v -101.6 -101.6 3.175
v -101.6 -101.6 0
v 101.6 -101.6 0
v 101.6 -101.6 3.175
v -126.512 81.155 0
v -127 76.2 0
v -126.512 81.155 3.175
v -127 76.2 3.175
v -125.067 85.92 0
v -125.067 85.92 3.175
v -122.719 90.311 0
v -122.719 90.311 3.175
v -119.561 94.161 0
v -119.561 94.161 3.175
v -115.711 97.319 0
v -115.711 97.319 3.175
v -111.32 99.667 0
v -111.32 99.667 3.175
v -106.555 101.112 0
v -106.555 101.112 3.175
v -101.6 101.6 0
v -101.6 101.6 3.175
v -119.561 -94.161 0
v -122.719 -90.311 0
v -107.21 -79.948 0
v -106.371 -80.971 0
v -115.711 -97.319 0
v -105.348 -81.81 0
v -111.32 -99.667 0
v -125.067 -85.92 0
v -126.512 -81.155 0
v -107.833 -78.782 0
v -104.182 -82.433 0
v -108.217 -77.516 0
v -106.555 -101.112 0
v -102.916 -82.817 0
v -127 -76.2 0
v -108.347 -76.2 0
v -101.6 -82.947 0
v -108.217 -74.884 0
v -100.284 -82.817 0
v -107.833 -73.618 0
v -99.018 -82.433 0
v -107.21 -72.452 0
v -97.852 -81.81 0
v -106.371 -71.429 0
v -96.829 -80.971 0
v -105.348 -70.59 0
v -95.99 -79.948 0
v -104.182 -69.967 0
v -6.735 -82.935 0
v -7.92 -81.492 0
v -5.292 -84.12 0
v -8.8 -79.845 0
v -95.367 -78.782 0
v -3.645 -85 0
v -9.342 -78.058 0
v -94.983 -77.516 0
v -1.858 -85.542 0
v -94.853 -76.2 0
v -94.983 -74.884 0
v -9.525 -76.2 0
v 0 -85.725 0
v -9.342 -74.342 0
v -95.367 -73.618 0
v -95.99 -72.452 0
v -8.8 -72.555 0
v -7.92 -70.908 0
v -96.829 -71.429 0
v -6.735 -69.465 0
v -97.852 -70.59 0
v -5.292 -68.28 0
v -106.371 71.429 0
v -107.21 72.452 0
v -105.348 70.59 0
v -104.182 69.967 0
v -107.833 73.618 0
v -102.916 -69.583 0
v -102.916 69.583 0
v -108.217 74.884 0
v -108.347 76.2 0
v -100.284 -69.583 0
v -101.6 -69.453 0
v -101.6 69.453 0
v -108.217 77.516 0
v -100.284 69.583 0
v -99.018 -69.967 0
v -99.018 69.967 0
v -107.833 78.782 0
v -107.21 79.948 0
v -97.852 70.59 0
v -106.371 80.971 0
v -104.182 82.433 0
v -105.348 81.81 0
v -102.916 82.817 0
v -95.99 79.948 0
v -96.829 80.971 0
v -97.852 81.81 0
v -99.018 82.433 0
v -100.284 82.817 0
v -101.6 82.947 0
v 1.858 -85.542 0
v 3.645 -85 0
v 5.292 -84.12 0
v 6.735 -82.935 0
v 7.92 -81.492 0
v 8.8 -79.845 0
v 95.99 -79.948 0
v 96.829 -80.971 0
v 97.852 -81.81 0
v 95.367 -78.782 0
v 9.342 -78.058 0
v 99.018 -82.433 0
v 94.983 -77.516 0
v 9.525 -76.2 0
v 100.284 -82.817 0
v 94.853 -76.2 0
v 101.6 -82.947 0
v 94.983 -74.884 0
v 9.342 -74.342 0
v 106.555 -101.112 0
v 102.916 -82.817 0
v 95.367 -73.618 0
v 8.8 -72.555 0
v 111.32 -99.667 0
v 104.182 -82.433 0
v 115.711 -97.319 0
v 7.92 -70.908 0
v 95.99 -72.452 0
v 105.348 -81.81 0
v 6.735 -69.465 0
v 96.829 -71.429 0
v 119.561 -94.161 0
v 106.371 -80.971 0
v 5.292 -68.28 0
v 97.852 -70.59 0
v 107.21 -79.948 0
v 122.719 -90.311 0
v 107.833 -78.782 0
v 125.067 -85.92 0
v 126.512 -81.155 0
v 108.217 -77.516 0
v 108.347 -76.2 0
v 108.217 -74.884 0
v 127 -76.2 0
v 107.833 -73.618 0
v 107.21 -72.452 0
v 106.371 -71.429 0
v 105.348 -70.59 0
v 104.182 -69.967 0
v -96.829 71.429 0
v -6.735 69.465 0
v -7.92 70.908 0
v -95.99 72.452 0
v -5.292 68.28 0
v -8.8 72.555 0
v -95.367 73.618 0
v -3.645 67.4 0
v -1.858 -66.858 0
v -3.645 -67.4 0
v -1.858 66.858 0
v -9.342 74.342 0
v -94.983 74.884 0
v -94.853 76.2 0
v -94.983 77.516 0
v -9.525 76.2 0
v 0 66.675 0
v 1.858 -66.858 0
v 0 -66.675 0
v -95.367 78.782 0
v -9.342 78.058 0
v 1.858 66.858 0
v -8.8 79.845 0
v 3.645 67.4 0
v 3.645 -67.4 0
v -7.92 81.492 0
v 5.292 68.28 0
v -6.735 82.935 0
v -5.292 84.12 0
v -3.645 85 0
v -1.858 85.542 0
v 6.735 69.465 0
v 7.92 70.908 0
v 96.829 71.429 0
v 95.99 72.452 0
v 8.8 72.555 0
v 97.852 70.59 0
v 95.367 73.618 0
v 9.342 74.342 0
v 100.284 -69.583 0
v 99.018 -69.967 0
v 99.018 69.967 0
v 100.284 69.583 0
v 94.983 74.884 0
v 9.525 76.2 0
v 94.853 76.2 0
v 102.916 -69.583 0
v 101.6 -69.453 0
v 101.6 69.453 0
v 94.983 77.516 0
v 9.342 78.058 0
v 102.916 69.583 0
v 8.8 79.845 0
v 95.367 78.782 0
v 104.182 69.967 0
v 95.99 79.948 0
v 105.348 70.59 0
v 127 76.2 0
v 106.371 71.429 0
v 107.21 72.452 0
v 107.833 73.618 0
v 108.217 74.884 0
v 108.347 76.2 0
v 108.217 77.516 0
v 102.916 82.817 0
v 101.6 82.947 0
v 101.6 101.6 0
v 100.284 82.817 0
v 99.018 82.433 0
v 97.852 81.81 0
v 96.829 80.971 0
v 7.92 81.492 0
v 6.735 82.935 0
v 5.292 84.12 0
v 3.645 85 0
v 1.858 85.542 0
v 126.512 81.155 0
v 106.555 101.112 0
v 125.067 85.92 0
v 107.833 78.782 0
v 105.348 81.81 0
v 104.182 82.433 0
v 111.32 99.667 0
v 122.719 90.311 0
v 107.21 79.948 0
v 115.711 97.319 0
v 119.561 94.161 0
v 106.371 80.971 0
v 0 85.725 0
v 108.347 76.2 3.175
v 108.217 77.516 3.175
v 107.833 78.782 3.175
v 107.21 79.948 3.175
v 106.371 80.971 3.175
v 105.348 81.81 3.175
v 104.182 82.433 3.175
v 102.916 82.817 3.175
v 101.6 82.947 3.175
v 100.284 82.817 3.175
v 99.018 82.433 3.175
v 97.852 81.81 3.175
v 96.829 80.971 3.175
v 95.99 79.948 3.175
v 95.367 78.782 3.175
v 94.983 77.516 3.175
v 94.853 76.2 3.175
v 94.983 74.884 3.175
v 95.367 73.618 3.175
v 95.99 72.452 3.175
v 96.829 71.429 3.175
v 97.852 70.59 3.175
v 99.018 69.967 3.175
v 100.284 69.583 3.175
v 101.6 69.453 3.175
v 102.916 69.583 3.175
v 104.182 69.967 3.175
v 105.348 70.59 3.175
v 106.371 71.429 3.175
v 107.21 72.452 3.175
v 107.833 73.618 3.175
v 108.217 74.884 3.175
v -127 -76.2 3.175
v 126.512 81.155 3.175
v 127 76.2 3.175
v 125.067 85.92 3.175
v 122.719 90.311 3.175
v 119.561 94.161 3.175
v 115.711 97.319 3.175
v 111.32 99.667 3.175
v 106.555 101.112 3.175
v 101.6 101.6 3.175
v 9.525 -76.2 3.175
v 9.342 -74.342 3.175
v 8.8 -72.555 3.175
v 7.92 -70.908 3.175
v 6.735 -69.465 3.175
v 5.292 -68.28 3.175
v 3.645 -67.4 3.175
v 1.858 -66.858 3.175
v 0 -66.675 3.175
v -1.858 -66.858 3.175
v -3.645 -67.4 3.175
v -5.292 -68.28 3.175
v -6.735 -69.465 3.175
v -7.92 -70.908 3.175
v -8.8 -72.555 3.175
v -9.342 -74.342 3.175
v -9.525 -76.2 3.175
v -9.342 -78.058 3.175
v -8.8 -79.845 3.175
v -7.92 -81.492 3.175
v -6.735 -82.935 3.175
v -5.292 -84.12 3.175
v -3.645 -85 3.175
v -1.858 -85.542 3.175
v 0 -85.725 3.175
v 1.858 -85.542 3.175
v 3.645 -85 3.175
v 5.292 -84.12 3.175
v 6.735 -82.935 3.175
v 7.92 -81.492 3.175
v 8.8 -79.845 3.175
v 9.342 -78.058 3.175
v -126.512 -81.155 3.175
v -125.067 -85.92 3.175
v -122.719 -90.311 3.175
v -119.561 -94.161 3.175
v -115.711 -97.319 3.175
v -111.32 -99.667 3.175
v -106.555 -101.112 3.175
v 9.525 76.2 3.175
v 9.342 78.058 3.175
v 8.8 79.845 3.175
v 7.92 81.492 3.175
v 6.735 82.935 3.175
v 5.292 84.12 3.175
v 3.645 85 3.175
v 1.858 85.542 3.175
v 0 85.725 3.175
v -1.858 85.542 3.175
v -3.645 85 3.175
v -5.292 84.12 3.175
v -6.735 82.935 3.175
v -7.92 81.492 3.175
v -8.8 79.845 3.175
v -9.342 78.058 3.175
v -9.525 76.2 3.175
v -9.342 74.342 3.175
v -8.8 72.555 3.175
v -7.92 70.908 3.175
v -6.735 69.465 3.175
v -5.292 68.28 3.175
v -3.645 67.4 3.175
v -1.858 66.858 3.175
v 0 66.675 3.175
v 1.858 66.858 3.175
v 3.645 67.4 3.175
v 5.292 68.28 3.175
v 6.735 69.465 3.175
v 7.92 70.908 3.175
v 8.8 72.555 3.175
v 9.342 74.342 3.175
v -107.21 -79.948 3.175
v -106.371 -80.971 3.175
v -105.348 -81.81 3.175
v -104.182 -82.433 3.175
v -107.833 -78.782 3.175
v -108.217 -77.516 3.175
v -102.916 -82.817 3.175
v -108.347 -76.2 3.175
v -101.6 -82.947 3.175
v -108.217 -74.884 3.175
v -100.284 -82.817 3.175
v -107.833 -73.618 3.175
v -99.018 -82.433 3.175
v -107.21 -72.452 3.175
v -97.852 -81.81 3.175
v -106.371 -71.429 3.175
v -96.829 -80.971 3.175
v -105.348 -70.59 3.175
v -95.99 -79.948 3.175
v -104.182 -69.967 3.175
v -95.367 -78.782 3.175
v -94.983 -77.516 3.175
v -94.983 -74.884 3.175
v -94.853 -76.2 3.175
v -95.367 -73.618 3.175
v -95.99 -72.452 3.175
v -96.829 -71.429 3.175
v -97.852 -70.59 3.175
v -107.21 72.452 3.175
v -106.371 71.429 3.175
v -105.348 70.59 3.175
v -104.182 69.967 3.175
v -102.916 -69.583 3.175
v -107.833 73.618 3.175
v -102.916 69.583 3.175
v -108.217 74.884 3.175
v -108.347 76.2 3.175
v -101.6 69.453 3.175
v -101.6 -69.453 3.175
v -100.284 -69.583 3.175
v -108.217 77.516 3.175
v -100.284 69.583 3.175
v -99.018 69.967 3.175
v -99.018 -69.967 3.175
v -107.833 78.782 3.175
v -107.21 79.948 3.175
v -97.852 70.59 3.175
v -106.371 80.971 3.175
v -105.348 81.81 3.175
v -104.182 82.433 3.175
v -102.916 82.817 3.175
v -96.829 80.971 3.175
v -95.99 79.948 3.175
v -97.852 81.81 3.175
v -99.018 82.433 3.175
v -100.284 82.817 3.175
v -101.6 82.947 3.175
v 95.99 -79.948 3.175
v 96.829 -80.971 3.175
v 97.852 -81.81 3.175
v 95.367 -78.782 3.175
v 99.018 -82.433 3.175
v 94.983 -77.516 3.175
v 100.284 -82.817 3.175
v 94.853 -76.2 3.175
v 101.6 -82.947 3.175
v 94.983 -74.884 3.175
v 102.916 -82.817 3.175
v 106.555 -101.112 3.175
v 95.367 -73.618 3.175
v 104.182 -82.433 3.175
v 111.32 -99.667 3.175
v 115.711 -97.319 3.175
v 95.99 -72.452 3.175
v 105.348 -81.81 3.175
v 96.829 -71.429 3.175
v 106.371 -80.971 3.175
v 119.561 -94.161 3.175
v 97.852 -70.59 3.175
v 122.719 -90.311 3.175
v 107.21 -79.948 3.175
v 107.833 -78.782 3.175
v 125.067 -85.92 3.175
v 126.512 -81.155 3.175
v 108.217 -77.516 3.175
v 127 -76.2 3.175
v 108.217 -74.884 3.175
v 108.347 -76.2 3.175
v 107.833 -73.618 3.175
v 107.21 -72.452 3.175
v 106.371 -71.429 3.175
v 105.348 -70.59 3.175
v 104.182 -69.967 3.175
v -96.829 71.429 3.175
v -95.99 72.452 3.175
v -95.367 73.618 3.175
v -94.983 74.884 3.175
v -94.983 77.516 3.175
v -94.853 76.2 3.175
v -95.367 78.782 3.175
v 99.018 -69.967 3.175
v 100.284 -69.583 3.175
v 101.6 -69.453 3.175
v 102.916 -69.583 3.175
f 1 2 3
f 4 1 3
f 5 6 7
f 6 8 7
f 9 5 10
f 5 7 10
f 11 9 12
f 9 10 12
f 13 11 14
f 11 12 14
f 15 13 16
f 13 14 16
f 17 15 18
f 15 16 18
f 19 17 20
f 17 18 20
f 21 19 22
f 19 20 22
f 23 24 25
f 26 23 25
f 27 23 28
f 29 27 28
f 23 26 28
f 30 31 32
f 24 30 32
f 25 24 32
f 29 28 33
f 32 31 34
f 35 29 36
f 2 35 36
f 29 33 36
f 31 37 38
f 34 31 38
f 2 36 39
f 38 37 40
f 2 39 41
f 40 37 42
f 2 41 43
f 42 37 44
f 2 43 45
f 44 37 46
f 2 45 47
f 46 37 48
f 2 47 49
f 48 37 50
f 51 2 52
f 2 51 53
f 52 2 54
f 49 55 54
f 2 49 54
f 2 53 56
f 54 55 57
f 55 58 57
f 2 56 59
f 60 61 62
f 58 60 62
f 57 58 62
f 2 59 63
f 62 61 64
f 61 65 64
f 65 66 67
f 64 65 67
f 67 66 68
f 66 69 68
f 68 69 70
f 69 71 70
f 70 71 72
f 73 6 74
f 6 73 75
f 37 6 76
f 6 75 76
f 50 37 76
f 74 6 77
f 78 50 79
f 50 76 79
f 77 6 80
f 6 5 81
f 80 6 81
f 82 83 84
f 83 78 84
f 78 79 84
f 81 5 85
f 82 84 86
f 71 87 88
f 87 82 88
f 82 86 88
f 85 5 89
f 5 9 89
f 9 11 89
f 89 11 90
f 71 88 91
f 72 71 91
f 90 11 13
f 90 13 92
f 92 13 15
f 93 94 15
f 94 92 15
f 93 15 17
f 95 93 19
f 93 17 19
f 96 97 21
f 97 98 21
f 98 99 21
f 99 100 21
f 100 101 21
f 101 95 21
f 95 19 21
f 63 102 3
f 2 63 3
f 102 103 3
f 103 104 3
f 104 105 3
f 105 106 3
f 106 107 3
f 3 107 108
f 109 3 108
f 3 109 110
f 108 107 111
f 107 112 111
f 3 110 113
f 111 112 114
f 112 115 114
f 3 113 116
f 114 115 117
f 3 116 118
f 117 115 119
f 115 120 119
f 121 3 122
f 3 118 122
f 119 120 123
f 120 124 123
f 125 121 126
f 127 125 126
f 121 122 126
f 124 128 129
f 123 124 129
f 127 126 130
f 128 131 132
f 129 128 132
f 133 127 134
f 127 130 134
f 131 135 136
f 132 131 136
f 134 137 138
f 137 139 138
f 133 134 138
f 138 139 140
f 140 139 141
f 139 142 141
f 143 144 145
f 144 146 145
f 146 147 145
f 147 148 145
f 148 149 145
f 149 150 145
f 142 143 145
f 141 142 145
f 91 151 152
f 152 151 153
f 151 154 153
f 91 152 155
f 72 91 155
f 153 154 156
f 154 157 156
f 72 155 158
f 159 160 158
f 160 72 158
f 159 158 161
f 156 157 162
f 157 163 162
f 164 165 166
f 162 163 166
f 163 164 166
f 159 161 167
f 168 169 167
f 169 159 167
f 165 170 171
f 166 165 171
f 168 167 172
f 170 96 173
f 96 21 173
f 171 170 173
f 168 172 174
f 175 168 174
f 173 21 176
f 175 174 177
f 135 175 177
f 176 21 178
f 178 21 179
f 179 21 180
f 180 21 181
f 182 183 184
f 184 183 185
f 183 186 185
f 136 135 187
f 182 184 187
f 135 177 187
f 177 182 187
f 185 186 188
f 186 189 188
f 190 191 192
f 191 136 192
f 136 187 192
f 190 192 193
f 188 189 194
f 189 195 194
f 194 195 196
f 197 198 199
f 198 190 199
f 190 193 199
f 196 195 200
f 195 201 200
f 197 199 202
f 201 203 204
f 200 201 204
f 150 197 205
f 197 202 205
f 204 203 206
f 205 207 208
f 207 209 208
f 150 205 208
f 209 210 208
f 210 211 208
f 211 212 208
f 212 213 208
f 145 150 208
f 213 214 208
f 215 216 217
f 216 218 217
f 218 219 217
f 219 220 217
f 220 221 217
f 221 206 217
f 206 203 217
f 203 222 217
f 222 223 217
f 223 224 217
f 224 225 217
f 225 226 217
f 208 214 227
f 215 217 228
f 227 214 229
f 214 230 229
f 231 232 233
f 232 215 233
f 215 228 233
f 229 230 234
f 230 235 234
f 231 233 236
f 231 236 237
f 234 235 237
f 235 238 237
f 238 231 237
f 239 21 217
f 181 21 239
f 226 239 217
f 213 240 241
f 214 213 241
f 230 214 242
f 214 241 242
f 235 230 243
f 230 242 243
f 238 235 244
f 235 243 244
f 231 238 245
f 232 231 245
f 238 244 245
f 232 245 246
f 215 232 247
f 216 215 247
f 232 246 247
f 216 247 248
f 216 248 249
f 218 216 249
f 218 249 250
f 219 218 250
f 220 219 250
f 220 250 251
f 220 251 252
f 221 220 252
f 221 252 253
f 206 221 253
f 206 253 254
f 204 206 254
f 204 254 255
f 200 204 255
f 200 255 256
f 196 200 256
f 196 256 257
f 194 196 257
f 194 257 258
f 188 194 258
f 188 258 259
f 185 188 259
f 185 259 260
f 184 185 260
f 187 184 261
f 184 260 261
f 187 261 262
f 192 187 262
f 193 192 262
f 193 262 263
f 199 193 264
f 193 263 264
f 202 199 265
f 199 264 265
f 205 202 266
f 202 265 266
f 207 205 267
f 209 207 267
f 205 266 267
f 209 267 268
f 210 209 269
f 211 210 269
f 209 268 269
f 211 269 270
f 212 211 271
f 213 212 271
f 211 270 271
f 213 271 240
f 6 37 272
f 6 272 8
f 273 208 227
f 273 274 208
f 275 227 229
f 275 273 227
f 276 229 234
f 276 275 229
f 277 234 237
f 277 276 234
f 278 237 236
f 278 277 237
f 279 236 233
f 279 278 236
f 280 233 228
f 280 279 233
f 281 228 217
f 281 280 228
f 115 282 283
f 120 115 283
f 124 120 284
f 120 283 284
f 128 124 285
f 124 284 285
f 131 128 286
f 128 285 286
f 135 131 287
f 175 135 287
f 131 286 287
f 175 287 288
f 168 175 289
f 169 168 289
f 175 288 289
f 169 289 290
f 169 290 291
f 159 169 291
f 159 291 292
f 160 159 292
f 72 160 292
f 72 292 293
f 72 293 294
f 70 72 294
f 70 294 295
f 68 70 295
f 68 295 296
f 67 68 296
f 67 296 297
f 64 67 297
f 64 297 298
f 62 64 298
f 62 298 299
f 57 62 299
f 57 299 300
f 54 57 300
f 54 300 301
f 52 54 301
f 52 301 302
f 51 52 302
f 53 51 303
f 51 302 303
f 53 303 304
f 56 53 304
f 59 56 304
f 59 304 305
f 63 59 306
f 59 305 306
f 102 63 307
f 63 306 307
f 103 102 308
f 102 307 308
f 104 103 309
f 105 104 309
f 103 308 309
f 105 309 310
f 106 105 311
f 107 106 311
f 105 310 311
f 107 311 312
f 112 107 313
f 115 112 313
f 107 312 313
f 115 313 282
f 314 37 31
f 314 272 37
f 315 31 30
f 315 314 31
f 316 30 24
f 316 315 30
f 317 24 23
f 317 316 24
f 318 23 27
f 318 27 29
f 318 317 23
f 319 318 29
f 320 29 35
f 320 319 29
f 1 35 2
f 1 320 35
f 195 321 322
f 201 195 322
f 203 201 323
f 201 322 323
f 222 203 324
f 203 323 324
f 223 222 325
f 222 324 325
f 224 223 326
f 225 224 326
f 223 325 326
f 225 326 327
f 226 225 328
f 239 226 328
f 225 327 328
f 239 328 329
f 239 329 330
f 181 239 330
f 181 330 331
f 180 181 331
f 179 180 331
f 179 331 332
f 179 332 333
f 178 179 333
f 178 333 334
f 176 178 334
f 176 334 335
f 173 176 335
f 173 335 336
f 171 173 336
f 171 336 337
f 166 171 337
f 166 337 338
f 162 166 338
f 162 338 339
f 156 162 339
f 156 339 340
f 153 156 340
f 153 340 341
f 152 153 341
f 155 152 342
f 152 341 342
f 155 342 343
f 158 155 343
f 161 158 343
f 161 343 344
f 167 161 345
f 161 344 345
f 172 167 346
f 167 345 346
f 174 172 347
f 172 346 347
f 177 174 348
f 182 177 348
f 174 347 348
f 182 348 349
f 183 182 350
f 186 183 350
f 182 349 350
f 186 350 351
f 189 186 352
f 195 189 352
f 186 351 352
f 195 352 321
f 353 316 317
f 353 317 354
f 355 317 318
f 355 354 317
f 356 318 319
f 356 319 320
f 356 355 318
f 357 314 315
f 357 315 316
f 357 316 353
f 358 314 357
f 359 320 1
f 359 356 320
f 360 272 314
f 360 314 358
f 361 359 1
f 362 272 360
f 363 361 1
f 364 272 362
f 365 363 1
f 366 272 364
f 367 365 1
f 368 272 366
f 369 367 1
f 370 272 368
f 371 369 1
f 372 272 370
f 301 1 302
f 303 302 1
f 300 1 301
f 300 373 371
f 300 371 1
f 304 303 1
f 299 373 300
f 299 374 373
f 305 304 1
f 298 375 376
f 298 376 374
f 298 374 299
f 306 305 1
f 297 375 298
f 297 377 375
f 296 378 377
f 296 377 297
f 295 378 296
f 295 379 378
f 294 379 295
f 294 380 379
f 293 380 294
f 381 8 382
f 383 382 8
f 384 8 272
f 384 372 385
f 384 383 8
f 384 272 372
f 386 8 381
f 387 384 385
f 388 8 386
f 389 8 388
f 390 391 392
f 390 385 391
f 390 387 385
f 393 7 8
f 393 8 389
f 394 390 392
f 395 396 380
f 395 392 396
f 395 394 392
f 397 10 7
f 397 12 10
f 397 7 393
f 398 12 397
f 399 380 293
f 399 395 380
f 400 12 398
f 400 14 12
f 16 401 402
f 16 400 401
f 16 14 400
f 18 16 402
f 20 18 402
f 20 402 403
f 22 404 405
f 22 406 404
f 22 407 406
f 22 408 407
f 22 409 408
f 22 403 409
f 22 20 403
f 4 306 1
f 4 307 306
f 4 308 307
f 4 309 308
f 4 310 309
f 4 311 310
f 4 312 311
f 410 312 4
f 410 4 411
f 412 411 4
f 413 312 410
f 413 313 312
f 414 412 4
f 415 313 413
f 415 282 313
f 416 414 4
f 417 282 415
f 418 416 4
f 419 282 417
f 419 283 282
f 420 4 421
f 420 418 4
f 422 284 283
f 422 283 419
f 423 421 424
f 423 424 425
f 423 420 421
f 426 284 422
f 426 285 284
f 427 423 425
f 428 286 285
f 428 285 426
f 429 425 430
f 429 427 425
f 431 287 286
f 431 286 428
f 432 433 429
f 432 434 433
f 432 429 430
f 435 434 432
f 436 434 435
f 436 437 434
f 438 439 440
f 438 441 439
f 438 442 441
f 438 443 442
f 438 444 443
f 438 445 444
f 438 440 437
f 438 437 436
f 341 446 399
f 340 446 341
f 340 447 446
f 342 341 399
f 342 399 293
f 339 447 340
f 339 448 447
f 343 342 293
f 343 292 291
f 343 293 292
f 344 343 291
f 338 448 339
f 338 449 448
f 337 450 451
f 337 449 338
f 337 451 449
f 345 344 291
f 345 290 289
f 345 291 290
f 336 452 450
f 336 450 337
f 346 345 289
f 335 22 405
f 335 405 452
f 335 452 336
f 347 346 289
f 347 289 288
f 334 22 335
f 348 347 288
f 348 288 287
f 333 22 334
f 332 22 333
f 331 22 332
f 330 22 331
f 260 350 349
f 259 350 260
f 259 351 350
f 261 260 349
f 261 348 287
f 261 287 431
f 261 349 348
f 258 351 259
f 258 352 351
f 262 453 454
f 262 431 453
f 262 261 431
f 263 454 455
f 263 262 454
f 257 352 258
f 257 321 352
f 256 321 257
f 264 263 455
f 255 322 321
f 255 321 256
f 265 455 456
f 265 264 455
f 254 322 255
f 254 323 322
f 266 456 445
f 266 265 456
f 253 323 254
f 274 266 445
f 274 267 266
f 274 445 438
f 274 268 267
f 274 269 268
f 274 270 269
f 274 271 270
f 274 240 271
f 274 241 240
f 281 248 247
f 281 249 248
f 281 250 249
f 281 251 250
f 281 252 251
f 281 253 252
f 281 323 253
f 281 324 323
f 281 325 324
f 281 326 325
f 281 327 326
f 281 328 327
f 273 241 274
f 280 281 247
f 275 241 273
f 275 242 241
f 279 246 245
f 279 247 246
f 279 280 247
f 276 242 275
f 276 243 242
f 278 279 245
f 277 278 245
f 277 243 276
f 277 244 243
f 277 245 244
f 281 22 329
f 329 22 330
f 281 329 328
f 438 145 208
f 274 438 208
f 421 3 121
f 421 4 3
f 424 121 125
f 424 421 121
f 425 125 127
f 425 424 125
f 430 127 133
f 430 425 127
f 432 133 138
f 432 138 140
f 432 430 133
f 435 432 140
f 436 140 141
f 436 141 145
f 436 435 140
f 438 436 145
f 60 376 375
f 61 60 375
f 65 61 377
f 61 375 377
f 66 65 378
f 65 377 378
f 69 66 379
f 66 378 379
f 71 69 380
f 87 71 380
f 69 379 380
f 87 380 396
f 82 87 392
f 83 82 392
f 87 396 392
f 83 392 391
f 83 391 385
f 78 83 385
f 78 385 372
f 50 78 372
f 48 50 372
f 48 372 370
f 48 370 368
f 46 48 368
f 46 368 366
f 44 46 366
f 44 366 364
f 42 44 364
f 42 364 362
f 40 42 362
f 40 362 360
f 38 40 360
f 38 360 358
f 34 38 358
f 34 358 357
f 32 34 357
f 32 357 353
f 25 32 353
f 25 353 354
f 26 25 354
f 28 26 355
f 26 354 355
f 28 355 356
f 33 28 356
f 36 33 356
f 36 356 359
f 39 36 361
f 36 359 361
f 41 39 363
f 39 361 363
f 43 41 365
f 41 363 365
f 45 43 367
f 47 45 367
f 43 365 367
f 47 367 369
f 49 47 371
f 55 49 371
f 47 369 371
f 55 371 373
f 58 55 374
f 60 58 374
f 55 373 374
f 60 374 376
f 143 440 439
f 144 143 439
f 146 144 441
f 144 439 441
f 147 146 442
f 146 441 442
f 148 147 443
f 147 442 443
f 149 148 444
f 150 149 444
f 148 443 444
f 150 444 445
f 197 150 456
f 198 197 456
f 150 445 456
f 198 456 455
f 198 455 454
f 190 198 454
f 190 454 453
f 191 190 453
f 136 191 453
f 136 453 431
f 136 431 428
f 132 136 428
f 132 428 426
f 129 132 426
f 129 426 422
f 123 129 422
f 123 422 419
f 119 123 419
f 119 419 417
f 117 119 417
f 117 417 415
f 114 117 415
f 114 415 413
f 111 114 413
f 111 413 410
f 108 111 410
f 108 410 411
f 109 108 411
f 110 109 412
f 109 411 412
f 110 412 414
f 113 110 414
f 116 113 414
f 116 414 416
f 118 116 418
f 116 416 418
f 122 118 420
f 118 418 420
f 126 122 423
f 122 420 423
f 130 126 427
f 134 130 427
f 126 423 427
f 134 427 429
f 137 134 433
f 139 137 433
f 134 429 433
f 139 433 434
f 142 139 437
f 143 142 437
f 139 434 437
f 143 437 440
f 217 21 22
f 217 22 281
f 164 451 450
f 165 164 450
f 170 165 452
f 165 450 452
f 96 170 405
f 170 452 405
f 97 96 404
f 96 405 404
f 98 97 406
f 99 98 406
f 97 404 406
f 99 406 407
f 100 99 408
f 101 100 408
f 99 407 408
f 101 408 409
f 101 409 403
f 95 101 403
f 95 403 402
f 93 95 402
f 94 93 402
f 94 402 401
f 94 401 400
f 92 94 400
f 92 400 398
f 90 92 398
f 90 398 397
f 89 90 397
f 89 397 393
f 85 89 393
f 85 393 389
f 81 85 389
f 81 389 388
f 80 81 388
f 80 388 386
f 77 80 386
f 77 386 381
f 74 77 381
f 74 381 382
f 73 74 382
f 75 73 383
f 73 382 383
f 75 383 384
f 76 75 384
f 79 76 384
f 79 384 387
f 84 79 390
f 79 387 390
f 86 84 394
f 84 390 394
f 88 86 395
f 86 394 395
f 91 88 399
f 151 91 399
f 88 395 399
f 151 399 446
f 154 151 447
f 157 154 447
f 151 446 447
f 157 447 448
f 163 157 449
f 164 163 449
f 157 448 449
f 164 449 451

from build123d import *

# Parameters (mm, degrees)
F0_W     = 254
F0_H     = 203.2
F1_DEPTH = 3.175
F2_R     = 25.4
F3_R     = 9.525
F3_R_2   = 6.746875
F4_DEPTH = 3.176


with BuildPart() as f1:
    # F0 (on Top) → F1 (new body)
    with BuildSketch(Plane.XY):
        Rectangle(F0_W, F0_H)
    extrude(amount=F1_DEPTH)

    # F2
    f2_edges = [f1.edges().sort_by_distance(p)[0] for p in [
        (127, 101.6, 1.5875),
        (-127, 101.6, 1.5875),
        (127, -101.6, 1.5875),
        (-127, -101.6, 1.5875),
    ]]
    fillet(f2_edges, radius=F2_R)

    # F3 (on face) → F4 (cut, through all)
    with BuildSketch(Plane.XY.offset(3.175)):
        with Locations((0, 76.2)):
            Circle(F3_R)
        with Locations((0, -76.2)):
            Circle(F3_R)
        with Locations((-101.6, 76.2)):
            Circle(F3_R_2)
        with Locations((-101.6, -76.2)):
            Circle(F3_R_2)
        with Locations((101.6, 76.2)):
            Circle(F3_R_2)
        with Locations((101.6, -76.2)):
            Circle(F3_R_2)
    extrude(amount=-F4_DEPTH, mode=Mode.SUBTRACT)


solid = f1.part
